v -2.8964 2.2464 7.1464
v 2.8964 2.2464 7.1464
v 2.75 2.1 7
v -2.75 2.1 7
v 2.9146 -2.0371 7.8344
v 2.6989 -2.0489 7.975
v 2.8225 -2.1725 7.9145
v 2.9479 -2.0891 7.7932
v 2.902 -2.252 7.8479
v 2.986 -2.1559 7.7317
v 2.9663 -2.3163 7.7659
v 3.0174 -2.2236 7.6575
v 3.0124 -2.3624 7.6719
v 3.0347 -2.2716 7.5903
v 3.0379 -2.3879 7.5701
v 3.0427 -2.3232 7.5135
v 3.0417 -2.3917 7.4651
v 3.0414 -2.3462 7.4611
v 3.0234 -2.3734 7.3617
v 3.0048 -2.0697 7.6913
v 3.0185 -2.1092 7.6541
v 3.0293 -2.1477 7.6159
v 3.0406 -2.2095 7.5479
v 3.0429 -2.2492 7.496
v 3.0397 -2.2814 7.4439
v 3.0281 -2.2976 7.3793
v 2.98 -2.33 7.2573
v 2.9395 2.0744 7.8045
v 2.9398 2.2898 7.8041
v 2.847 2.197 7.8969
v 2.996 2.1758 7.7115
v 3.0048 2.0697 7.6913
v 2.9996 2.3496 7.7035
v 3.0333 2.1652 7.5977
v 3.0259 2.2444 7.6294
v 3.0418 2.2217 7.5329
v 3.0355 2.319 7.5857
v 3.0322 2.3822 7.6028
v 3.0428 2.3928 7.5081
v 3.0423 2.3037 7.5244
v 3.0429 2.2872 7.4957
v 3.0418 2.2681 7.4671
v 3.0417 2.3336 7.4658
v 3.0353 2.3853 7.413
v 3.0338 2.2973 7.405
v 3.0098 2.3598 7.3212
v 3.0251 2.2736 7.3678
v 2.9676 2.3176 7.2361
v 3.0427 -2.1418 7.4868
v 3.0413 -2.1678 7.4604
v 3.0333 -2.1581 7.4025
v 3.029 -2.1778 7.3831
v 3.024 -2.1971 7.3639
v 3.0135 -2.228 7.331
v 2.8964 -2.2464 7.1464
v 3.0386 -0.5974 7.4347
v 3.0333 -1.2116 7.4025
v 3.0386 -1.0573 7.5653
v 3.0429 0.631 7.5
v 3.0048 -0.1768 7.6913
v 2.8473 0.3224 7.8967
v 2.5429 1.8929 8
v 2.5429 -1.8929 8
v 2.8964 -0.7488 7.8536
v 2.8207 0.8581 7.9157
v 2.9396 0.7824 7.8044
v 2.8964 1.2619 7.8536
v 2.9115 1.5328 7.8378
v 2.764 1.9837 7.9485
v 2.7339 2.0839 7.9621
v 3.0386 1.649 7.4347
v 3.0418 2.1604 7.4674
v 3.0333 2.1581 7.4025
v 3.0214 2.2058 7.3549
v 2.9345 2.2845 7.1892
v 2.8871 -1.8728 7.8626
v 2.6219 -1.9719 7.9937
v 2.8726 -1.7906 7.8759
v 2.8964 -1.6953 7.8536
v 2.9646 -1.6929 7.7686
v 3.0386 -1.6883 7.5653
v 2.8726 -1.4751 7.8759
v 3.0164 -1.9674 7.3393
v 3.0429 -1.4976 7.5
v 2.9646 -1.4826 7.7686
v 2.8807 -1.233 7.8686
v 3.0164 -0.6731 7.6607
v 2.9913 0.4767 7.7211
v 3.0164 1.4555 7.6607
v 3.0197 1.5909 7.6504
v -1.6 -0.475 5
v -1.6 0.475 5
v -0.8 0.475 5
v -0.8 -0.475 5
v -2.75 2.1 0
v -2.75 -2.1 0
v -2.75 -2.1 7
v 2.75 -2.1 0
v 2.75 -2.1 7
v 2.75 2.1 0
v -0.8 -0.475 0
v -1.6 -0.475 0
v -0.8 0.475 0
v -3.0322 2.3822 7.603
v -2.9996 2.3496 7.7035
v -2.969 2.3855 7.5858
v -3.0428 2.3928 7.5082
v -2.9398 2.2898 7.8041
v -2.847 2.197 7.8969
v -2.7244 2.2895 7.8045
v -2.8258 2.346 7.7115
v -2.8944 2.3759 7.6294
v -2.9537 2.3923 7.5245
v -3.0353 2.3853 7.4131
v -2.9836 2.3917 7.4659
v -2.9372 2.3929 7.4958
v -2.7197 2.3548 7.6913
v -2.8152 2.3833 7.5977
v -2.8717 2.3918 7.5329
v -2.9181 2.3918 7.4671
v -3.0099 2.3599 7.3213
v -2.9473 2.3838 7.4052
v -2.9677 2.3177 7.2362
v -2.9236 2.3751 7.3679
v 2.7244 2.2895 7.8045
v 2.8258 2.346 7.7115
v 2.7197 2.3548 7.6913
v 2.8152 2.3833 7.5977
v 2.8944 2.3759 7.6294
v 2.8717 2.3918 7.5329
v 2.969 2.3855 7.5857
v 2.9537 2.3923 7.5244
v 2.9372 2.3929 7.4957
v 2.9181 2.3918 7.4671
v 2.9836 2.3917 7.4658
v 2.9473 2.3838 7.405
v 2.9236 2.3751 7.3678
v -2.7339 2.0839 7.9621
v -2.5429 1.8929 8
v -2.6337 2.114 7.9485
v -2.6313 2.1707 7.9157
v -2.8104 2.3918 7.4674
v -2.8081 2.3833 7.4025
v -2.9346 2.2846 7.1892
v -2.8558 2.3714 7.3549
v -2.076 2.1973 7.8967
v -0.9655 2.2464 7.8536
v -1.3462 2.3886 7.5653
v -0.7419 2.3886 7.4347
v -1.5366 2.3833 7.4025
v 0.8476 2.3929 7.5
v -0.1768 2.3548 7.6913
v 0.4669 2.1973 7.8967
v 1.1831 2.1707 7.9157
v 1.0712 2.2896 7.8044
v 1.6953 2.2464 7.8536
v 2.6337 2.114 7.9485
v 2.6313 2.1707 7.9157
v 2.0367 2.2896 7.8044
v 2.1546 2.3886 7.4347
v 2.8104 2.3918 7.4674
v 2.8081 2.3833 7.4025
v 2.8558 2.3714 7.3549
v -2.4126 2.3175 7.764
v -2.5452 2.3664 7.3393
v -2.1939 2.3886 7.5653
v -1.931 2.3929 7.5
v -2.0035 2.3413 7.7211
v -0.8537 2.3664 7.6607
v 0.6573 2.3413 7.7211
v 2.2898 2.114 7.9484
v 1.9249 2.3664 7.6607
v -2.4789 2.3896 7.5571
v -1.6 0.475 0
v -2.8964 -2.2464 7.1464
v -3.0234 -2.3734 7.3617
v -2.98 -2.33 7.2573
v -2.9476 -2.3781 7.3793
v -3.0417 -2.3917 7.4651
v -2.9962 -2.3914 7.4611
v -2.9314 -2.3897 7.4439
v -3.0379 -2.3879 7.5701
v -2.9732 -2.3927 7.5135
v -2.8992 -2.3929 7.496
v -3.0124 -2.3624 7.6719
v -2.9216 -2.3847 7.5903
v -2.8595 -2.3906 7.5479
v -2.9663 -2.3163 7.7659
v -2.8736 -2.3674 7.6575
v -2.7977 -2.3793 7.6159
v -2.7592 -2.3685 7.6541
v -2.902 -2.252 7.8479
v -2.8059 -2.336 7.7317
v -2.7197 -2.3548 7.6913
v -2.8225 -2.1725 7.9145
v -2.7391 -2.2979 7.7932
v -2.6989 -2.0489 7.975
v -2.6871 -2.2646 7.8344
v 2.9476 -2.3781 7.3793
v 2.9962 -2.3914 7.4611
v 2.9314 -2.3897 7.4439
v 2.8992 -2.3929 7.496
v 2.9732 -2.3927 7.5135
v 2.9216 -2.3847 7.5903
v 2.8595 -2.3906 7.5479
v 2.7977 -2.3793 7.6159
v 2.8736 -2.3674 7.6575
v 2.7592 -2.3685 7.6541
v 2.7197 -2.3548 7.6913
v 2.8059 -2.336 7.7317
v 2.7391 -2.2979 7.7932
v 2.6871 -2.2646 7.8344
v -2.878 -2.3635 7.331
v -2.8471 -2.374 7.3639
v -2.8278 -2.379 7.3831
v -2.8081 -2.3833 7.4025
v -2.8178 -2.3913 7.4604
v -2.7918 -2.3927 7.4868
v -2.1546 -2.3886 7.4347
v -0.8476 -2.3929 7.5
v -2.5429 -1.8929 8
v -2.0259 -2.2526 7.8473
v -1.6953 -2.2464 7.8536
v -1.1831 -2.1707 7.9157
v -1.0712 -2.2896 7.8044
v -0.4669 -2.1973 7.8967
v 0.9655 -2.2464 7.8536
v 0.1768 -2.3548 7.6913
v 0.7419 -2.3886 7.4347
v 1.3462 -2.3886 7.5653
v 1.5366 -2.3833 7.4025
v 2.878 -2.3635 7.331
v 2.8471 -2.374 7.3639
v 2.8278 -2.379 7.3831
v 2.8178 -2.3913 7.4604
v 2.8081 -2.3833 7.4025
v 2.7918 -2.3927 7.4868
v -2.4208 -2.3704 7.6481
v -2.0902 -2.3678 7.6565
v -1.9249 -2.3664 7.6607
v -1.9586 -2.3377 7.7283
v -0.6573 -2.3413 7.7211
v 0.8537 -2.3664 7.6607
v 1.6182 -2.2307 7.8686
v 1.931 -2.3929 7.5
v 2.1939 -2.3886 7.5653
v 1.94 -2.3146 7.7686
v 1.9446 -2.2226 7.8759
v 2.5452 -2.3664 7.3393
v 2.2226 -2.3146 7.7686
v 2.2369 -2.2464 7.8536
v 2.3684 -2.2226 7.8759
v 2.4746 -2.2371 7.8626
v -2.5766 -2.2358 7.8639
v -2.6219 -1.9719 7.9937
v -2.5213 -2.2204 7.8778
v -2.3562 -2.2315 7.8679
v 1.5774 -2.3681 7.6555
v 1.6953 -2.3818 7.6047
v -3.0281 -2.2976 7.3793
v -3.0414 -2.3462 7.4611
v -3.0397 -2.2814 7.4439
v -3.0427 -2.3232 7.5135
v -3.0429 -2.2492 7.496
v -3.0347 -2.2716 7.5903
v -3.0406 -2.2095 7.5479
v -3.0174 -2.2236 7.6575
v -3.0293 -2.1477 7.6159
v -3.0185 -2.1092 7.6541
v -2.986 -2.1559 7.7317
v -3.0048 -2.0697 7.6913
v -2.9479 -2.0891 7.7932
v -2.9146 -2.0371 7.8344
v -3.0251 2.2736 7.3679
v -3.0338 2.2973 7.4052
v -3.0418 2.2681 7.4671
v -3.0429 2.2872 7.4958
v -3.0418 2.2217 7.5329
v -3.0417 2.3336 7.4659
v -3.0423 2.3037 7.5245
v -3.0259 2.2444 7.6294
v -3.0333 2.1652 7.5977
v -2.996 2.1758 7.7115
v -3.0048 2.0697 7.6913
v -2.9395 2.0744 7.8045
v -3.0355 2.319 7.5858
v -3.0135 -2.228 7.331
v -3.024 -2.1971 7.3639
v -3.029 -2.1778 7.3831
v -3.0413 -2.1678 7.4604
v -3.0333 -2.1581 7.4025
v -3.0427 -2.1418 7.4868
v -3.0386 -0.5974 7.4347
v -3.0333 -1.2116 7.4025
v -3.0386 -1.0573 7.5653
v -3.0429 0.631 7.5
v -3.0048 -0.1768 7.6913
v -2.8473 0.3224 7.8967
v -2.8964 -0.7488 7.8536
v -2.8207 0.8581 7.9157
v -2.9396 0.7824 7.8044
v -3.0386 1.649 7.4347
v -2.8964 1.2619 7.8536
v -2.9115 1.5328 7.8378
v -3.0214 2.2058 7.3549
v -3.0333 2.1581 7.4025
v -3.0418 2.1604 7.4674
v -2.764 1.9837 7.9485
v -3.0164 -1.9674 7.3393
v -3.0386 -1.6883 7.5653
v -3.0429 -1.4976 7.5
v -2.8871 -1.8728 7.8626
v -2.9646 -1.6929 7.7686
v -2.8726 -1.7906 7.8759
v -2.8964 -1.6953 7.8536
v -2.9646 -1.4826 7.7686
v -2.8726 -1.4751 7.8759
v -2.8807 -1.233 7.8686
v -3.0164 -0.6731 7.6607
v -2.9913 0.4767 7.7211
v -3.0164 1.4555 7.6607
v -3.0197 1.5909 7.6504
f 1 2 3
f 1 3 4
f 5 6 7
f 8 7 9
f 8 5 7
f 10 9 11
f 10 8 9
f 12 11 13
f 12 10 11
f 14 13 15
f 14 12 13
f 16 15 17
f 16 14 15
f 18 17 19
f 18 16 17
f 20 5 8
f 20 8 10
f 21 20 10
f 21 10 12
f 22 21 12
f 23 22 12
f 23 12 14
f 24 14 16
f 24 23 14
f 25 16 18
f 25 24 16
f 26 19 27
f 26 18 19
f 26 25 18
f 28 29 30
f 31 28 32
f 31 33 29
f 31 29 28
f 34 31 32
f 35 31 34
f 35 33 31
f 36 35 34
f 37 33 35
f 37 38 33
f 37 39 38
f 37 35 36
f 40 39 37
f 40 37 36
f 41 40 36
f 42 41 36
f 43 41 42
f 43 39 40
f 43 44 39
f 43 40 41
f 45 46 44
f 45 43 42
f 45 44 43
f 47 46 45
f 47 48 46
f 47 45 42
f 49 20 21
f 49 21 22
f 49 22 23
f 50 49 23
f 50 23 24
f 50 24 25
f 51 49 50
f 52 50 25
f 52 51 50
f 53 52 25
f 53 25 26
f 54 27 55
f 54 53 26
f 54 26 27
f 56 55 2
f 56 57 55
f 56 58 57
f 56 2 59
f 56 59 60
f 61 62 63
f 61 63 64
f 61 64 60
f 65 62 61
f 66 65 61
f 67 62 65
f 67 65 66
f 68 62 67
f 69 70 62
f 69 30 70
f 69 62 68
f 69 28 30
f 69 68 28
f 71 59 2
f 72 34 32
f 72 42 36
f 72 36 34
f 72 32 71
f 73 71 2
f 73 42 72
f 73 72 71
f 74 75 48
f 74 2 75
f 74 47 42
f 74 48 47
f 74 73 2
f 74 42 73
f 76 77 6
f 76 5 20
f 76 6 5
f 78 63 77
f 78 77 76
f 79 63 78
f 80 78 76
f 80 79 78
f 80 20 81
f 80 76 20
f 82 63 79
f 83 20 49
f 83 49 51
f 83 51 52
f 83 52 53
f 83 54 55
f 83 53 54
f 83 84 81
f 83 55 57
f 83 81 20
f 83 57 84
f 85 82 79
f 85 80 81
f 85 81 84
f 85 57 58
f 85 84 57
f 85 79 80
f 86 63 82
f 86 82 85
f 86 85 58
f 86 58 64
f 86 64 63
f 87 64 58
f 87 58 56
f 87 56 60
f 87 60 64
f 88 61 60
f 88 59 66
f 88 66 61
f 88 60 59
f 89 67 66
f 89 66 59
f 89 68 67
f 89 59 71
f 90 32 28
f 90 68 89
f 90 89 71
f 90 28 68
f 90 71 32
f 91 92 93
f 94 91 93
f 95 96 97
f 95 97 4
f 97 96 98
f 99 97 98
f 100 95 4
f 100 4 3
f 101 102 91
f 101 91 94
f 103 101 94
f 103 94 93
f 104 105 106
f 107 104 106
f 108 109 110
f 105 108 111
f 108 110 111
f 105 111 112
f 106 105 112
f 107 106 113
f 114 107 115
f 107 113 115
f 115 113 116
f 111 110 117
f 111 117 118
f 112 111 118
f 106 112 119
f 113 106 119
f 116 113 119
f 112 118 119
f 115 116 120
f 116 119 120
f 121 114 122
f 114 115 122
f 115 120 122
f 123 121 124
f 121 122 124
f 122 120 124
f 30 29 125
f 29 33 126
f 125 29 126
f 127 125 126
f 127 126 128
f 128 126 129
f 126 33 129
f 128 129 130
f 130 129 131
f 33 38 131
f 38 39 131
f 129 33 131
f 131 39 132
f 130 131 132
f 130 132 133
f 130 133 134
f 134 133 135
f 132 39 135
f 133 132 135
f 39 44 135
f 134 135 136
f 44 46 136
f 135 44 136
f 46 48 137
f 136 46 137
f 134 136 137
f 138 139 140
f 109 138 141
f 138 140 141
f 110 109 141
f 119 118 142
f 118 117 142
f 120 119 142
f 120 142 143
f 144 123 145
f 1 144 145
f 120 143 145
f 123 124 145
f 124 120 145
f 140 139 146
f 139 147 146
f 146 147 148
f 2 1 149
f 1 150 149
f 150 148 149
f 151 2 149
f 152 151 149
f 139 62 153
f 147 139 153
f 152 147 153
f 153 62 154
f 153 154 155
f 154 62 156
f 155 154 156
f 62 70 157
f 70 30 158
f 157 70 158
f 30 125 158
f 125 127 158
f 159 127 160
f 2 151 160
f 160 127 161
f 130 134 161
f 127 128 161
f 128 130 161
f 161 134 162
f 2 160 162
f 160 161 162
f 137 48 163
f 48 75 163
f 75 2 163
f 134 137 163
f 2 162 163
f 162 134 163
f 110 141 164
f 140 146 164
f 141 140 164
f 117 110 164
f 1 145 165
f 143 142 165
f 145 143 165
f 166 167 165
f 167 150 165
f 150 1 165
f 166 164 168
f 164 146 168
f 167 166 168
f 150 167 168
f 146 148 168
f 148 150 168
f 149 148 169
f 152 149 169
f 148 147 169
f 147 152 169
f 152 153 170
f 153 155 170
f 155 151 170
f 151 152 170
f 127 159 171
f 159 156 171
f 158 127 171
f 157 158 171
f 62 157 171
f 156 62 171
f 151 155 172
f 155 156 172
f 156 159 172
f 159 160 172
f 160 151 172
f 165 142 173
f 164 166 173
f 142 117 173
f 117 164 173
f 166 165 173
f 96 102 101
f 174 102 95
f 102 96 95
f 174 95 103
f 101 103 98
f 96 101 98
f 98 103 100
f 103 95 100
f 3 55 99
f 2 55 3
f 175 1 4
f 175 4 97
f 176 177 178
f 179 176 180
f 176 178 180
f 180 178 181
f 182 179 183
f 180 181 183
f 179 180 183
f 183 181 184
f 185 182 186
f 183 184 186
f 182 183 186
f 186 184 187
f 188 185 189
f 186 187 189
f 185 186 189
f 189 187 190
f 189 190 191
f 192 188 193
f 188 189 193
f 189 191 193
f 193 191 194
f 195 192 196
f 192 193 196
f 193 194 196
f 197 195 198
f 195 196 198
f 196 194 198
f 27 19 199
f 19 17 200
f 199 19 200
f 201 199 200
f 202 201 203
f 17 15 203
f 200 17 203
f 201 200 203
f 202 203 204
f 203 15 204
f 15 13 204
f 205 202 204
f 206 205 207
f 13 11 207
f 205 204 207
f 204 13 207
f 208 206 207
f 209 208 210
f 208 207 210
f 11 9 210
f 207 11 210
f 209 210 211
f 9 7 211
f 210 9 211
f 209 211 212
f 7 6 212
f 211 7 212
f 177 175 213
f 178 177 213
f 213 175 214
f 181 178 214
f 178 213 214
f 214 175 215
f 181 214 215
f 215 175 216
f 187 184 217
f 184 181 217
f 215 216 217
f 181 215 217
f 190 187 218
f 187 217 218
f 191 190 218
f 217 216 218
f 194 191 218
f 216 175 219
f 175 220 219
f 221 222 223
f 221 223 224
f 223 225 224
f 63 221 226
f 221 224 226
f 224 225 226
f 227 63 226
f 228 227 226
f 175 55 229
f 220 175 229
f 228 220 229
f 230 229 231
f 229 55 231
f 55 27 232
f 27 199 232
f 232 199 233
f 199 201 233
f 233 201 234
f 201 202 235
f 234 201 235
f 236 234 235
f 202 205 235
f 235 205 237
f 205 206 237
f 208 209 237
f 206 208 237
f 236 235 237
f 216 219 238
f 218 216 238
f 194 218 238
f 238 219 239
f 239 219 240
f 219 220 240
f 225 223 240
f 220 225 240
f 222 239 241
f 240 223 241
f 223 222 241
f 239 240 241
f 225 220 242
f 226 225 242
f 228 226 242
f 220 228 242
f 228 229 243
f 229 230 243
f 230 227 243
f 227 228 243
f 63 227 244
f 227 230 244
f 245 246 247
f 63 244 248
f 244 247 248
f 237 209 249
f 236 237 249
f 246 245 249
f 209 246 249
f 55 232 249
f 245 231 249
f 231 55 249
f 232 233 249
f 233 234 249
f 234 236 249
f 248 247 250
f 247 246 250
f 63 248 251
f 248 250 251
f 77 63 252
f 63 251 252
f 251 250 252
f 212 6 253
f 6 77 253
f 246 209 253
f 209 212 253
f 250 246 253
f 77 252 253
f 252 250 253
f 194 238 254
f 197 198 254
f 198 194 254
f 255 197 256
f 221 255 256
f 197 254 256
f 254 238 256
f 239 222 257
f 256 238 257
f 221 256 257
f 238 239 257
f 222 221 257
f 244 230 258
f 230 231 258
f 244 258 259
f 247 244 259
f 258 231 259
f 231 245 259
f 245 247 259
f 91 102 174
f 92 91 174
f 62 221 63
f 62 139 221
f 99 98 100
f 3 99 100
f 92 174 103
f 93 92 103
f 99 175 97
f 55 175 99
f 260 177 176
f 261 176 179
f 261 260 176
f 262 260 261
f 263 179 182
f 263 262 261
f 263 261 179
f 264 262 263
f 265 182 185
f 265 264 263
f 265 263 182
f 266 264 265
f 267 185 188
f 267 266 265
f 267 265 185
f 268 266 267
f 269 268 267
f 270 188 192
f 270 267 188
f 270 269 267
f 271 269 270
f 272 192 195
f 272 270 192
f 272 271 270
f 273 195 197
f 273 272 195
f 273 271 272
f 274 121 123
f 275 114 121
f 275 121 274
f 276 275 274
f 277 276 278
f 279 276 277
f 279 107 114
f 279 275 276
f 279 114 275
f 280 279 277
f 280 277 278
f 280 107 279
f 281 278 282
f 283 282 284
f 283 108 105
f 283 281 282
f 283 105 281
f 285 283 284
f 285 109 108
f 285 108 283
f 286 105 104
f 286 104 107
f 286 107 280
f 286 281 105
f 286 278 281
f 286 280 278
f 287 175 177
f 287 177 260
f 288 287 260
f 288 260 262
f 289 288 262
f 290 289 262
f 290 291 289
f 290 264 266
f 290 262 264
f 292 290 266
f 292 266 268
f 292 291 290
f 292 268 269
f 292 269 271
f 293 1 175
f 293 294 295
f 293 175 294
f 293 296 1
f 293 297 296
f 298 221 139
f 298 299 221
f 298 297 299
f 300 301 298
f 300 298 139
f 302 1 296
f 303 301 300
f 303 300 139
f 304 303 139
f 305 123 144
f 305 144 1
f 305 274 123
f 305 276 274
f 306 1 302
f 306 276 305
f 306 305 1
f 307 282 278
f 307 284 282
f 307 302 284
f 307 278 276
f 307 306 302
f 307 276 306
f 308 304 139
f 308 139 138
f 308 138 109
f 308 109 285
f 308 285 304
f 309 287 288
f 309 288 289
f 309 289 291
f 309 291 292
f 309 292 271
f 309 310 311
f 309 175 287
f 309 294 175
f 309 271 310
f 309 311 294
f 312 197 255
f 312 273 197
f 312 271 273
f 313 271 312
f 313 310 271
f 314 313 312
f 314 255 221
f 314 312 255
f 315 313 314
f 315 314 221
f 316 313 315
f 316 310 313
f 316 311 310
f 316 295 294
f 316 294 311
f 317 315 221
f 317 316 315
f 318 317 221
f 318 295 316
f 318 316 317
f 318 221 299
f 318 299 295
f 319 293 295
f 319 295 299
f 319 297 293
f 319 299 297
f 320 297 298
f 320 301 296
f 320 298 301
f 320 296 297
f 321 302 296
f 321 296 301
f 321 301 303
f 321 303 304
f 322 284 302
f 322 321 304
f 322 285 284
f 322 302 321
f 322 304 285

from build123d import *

# Parameters (mm, degrees)
F0_W      = 5.5
F0_H      = 4.2
F1_DEPTH  = 7
F2_W      = 0.8
F2_H      = 0.95
F3_DEPTH  = 5
F1_FACE_W = 5.5
F1_FACE_H = 4.2
F4_DEPTH  = 1
F4_TAPER  = -45
F6_R      = 0.5


# Not quite as in the source:
# - a feature of the source that left no trace in its solid (it failed there, or was rolled back) is left out


with BuildPart() as f1:
    # F0 (on Top) → F1 (new body)
    with BuildSketch(Plane.XY):
        Rectangle(F0_W, F0_H)
    extrude(amount=F1_DEPTH)

    # F2 (on Top) → F3 (cut)
    with BuildSketch(Plane.XY):
        with Locations((-1.2, 0)):
            Rectangle(F2_W, F2_H)
    extrude(amount=F3_DEPTH, mode=Mode.SUBTRACT)

    # F1_face (on face) → F4 (join)
    with BuildSketch(Plane.XY.offset(7)):
        Rectangle(F1_FACE_W, F1_FACE_H)
    extrude(amount=F4_DEPTH, taper=F4_TAPER)

    # F6
    f6_edges = [f1.edges().sort_by_distance(p)[0] for p in [
        (0, -3.1, 8),
        (3.75, 0, 8),
        (0, 3.1, 8),
        (-3.75, 0, 8),
    ]]
    fillet(f6_edges, radius=F6_R)


solid = f1.part
